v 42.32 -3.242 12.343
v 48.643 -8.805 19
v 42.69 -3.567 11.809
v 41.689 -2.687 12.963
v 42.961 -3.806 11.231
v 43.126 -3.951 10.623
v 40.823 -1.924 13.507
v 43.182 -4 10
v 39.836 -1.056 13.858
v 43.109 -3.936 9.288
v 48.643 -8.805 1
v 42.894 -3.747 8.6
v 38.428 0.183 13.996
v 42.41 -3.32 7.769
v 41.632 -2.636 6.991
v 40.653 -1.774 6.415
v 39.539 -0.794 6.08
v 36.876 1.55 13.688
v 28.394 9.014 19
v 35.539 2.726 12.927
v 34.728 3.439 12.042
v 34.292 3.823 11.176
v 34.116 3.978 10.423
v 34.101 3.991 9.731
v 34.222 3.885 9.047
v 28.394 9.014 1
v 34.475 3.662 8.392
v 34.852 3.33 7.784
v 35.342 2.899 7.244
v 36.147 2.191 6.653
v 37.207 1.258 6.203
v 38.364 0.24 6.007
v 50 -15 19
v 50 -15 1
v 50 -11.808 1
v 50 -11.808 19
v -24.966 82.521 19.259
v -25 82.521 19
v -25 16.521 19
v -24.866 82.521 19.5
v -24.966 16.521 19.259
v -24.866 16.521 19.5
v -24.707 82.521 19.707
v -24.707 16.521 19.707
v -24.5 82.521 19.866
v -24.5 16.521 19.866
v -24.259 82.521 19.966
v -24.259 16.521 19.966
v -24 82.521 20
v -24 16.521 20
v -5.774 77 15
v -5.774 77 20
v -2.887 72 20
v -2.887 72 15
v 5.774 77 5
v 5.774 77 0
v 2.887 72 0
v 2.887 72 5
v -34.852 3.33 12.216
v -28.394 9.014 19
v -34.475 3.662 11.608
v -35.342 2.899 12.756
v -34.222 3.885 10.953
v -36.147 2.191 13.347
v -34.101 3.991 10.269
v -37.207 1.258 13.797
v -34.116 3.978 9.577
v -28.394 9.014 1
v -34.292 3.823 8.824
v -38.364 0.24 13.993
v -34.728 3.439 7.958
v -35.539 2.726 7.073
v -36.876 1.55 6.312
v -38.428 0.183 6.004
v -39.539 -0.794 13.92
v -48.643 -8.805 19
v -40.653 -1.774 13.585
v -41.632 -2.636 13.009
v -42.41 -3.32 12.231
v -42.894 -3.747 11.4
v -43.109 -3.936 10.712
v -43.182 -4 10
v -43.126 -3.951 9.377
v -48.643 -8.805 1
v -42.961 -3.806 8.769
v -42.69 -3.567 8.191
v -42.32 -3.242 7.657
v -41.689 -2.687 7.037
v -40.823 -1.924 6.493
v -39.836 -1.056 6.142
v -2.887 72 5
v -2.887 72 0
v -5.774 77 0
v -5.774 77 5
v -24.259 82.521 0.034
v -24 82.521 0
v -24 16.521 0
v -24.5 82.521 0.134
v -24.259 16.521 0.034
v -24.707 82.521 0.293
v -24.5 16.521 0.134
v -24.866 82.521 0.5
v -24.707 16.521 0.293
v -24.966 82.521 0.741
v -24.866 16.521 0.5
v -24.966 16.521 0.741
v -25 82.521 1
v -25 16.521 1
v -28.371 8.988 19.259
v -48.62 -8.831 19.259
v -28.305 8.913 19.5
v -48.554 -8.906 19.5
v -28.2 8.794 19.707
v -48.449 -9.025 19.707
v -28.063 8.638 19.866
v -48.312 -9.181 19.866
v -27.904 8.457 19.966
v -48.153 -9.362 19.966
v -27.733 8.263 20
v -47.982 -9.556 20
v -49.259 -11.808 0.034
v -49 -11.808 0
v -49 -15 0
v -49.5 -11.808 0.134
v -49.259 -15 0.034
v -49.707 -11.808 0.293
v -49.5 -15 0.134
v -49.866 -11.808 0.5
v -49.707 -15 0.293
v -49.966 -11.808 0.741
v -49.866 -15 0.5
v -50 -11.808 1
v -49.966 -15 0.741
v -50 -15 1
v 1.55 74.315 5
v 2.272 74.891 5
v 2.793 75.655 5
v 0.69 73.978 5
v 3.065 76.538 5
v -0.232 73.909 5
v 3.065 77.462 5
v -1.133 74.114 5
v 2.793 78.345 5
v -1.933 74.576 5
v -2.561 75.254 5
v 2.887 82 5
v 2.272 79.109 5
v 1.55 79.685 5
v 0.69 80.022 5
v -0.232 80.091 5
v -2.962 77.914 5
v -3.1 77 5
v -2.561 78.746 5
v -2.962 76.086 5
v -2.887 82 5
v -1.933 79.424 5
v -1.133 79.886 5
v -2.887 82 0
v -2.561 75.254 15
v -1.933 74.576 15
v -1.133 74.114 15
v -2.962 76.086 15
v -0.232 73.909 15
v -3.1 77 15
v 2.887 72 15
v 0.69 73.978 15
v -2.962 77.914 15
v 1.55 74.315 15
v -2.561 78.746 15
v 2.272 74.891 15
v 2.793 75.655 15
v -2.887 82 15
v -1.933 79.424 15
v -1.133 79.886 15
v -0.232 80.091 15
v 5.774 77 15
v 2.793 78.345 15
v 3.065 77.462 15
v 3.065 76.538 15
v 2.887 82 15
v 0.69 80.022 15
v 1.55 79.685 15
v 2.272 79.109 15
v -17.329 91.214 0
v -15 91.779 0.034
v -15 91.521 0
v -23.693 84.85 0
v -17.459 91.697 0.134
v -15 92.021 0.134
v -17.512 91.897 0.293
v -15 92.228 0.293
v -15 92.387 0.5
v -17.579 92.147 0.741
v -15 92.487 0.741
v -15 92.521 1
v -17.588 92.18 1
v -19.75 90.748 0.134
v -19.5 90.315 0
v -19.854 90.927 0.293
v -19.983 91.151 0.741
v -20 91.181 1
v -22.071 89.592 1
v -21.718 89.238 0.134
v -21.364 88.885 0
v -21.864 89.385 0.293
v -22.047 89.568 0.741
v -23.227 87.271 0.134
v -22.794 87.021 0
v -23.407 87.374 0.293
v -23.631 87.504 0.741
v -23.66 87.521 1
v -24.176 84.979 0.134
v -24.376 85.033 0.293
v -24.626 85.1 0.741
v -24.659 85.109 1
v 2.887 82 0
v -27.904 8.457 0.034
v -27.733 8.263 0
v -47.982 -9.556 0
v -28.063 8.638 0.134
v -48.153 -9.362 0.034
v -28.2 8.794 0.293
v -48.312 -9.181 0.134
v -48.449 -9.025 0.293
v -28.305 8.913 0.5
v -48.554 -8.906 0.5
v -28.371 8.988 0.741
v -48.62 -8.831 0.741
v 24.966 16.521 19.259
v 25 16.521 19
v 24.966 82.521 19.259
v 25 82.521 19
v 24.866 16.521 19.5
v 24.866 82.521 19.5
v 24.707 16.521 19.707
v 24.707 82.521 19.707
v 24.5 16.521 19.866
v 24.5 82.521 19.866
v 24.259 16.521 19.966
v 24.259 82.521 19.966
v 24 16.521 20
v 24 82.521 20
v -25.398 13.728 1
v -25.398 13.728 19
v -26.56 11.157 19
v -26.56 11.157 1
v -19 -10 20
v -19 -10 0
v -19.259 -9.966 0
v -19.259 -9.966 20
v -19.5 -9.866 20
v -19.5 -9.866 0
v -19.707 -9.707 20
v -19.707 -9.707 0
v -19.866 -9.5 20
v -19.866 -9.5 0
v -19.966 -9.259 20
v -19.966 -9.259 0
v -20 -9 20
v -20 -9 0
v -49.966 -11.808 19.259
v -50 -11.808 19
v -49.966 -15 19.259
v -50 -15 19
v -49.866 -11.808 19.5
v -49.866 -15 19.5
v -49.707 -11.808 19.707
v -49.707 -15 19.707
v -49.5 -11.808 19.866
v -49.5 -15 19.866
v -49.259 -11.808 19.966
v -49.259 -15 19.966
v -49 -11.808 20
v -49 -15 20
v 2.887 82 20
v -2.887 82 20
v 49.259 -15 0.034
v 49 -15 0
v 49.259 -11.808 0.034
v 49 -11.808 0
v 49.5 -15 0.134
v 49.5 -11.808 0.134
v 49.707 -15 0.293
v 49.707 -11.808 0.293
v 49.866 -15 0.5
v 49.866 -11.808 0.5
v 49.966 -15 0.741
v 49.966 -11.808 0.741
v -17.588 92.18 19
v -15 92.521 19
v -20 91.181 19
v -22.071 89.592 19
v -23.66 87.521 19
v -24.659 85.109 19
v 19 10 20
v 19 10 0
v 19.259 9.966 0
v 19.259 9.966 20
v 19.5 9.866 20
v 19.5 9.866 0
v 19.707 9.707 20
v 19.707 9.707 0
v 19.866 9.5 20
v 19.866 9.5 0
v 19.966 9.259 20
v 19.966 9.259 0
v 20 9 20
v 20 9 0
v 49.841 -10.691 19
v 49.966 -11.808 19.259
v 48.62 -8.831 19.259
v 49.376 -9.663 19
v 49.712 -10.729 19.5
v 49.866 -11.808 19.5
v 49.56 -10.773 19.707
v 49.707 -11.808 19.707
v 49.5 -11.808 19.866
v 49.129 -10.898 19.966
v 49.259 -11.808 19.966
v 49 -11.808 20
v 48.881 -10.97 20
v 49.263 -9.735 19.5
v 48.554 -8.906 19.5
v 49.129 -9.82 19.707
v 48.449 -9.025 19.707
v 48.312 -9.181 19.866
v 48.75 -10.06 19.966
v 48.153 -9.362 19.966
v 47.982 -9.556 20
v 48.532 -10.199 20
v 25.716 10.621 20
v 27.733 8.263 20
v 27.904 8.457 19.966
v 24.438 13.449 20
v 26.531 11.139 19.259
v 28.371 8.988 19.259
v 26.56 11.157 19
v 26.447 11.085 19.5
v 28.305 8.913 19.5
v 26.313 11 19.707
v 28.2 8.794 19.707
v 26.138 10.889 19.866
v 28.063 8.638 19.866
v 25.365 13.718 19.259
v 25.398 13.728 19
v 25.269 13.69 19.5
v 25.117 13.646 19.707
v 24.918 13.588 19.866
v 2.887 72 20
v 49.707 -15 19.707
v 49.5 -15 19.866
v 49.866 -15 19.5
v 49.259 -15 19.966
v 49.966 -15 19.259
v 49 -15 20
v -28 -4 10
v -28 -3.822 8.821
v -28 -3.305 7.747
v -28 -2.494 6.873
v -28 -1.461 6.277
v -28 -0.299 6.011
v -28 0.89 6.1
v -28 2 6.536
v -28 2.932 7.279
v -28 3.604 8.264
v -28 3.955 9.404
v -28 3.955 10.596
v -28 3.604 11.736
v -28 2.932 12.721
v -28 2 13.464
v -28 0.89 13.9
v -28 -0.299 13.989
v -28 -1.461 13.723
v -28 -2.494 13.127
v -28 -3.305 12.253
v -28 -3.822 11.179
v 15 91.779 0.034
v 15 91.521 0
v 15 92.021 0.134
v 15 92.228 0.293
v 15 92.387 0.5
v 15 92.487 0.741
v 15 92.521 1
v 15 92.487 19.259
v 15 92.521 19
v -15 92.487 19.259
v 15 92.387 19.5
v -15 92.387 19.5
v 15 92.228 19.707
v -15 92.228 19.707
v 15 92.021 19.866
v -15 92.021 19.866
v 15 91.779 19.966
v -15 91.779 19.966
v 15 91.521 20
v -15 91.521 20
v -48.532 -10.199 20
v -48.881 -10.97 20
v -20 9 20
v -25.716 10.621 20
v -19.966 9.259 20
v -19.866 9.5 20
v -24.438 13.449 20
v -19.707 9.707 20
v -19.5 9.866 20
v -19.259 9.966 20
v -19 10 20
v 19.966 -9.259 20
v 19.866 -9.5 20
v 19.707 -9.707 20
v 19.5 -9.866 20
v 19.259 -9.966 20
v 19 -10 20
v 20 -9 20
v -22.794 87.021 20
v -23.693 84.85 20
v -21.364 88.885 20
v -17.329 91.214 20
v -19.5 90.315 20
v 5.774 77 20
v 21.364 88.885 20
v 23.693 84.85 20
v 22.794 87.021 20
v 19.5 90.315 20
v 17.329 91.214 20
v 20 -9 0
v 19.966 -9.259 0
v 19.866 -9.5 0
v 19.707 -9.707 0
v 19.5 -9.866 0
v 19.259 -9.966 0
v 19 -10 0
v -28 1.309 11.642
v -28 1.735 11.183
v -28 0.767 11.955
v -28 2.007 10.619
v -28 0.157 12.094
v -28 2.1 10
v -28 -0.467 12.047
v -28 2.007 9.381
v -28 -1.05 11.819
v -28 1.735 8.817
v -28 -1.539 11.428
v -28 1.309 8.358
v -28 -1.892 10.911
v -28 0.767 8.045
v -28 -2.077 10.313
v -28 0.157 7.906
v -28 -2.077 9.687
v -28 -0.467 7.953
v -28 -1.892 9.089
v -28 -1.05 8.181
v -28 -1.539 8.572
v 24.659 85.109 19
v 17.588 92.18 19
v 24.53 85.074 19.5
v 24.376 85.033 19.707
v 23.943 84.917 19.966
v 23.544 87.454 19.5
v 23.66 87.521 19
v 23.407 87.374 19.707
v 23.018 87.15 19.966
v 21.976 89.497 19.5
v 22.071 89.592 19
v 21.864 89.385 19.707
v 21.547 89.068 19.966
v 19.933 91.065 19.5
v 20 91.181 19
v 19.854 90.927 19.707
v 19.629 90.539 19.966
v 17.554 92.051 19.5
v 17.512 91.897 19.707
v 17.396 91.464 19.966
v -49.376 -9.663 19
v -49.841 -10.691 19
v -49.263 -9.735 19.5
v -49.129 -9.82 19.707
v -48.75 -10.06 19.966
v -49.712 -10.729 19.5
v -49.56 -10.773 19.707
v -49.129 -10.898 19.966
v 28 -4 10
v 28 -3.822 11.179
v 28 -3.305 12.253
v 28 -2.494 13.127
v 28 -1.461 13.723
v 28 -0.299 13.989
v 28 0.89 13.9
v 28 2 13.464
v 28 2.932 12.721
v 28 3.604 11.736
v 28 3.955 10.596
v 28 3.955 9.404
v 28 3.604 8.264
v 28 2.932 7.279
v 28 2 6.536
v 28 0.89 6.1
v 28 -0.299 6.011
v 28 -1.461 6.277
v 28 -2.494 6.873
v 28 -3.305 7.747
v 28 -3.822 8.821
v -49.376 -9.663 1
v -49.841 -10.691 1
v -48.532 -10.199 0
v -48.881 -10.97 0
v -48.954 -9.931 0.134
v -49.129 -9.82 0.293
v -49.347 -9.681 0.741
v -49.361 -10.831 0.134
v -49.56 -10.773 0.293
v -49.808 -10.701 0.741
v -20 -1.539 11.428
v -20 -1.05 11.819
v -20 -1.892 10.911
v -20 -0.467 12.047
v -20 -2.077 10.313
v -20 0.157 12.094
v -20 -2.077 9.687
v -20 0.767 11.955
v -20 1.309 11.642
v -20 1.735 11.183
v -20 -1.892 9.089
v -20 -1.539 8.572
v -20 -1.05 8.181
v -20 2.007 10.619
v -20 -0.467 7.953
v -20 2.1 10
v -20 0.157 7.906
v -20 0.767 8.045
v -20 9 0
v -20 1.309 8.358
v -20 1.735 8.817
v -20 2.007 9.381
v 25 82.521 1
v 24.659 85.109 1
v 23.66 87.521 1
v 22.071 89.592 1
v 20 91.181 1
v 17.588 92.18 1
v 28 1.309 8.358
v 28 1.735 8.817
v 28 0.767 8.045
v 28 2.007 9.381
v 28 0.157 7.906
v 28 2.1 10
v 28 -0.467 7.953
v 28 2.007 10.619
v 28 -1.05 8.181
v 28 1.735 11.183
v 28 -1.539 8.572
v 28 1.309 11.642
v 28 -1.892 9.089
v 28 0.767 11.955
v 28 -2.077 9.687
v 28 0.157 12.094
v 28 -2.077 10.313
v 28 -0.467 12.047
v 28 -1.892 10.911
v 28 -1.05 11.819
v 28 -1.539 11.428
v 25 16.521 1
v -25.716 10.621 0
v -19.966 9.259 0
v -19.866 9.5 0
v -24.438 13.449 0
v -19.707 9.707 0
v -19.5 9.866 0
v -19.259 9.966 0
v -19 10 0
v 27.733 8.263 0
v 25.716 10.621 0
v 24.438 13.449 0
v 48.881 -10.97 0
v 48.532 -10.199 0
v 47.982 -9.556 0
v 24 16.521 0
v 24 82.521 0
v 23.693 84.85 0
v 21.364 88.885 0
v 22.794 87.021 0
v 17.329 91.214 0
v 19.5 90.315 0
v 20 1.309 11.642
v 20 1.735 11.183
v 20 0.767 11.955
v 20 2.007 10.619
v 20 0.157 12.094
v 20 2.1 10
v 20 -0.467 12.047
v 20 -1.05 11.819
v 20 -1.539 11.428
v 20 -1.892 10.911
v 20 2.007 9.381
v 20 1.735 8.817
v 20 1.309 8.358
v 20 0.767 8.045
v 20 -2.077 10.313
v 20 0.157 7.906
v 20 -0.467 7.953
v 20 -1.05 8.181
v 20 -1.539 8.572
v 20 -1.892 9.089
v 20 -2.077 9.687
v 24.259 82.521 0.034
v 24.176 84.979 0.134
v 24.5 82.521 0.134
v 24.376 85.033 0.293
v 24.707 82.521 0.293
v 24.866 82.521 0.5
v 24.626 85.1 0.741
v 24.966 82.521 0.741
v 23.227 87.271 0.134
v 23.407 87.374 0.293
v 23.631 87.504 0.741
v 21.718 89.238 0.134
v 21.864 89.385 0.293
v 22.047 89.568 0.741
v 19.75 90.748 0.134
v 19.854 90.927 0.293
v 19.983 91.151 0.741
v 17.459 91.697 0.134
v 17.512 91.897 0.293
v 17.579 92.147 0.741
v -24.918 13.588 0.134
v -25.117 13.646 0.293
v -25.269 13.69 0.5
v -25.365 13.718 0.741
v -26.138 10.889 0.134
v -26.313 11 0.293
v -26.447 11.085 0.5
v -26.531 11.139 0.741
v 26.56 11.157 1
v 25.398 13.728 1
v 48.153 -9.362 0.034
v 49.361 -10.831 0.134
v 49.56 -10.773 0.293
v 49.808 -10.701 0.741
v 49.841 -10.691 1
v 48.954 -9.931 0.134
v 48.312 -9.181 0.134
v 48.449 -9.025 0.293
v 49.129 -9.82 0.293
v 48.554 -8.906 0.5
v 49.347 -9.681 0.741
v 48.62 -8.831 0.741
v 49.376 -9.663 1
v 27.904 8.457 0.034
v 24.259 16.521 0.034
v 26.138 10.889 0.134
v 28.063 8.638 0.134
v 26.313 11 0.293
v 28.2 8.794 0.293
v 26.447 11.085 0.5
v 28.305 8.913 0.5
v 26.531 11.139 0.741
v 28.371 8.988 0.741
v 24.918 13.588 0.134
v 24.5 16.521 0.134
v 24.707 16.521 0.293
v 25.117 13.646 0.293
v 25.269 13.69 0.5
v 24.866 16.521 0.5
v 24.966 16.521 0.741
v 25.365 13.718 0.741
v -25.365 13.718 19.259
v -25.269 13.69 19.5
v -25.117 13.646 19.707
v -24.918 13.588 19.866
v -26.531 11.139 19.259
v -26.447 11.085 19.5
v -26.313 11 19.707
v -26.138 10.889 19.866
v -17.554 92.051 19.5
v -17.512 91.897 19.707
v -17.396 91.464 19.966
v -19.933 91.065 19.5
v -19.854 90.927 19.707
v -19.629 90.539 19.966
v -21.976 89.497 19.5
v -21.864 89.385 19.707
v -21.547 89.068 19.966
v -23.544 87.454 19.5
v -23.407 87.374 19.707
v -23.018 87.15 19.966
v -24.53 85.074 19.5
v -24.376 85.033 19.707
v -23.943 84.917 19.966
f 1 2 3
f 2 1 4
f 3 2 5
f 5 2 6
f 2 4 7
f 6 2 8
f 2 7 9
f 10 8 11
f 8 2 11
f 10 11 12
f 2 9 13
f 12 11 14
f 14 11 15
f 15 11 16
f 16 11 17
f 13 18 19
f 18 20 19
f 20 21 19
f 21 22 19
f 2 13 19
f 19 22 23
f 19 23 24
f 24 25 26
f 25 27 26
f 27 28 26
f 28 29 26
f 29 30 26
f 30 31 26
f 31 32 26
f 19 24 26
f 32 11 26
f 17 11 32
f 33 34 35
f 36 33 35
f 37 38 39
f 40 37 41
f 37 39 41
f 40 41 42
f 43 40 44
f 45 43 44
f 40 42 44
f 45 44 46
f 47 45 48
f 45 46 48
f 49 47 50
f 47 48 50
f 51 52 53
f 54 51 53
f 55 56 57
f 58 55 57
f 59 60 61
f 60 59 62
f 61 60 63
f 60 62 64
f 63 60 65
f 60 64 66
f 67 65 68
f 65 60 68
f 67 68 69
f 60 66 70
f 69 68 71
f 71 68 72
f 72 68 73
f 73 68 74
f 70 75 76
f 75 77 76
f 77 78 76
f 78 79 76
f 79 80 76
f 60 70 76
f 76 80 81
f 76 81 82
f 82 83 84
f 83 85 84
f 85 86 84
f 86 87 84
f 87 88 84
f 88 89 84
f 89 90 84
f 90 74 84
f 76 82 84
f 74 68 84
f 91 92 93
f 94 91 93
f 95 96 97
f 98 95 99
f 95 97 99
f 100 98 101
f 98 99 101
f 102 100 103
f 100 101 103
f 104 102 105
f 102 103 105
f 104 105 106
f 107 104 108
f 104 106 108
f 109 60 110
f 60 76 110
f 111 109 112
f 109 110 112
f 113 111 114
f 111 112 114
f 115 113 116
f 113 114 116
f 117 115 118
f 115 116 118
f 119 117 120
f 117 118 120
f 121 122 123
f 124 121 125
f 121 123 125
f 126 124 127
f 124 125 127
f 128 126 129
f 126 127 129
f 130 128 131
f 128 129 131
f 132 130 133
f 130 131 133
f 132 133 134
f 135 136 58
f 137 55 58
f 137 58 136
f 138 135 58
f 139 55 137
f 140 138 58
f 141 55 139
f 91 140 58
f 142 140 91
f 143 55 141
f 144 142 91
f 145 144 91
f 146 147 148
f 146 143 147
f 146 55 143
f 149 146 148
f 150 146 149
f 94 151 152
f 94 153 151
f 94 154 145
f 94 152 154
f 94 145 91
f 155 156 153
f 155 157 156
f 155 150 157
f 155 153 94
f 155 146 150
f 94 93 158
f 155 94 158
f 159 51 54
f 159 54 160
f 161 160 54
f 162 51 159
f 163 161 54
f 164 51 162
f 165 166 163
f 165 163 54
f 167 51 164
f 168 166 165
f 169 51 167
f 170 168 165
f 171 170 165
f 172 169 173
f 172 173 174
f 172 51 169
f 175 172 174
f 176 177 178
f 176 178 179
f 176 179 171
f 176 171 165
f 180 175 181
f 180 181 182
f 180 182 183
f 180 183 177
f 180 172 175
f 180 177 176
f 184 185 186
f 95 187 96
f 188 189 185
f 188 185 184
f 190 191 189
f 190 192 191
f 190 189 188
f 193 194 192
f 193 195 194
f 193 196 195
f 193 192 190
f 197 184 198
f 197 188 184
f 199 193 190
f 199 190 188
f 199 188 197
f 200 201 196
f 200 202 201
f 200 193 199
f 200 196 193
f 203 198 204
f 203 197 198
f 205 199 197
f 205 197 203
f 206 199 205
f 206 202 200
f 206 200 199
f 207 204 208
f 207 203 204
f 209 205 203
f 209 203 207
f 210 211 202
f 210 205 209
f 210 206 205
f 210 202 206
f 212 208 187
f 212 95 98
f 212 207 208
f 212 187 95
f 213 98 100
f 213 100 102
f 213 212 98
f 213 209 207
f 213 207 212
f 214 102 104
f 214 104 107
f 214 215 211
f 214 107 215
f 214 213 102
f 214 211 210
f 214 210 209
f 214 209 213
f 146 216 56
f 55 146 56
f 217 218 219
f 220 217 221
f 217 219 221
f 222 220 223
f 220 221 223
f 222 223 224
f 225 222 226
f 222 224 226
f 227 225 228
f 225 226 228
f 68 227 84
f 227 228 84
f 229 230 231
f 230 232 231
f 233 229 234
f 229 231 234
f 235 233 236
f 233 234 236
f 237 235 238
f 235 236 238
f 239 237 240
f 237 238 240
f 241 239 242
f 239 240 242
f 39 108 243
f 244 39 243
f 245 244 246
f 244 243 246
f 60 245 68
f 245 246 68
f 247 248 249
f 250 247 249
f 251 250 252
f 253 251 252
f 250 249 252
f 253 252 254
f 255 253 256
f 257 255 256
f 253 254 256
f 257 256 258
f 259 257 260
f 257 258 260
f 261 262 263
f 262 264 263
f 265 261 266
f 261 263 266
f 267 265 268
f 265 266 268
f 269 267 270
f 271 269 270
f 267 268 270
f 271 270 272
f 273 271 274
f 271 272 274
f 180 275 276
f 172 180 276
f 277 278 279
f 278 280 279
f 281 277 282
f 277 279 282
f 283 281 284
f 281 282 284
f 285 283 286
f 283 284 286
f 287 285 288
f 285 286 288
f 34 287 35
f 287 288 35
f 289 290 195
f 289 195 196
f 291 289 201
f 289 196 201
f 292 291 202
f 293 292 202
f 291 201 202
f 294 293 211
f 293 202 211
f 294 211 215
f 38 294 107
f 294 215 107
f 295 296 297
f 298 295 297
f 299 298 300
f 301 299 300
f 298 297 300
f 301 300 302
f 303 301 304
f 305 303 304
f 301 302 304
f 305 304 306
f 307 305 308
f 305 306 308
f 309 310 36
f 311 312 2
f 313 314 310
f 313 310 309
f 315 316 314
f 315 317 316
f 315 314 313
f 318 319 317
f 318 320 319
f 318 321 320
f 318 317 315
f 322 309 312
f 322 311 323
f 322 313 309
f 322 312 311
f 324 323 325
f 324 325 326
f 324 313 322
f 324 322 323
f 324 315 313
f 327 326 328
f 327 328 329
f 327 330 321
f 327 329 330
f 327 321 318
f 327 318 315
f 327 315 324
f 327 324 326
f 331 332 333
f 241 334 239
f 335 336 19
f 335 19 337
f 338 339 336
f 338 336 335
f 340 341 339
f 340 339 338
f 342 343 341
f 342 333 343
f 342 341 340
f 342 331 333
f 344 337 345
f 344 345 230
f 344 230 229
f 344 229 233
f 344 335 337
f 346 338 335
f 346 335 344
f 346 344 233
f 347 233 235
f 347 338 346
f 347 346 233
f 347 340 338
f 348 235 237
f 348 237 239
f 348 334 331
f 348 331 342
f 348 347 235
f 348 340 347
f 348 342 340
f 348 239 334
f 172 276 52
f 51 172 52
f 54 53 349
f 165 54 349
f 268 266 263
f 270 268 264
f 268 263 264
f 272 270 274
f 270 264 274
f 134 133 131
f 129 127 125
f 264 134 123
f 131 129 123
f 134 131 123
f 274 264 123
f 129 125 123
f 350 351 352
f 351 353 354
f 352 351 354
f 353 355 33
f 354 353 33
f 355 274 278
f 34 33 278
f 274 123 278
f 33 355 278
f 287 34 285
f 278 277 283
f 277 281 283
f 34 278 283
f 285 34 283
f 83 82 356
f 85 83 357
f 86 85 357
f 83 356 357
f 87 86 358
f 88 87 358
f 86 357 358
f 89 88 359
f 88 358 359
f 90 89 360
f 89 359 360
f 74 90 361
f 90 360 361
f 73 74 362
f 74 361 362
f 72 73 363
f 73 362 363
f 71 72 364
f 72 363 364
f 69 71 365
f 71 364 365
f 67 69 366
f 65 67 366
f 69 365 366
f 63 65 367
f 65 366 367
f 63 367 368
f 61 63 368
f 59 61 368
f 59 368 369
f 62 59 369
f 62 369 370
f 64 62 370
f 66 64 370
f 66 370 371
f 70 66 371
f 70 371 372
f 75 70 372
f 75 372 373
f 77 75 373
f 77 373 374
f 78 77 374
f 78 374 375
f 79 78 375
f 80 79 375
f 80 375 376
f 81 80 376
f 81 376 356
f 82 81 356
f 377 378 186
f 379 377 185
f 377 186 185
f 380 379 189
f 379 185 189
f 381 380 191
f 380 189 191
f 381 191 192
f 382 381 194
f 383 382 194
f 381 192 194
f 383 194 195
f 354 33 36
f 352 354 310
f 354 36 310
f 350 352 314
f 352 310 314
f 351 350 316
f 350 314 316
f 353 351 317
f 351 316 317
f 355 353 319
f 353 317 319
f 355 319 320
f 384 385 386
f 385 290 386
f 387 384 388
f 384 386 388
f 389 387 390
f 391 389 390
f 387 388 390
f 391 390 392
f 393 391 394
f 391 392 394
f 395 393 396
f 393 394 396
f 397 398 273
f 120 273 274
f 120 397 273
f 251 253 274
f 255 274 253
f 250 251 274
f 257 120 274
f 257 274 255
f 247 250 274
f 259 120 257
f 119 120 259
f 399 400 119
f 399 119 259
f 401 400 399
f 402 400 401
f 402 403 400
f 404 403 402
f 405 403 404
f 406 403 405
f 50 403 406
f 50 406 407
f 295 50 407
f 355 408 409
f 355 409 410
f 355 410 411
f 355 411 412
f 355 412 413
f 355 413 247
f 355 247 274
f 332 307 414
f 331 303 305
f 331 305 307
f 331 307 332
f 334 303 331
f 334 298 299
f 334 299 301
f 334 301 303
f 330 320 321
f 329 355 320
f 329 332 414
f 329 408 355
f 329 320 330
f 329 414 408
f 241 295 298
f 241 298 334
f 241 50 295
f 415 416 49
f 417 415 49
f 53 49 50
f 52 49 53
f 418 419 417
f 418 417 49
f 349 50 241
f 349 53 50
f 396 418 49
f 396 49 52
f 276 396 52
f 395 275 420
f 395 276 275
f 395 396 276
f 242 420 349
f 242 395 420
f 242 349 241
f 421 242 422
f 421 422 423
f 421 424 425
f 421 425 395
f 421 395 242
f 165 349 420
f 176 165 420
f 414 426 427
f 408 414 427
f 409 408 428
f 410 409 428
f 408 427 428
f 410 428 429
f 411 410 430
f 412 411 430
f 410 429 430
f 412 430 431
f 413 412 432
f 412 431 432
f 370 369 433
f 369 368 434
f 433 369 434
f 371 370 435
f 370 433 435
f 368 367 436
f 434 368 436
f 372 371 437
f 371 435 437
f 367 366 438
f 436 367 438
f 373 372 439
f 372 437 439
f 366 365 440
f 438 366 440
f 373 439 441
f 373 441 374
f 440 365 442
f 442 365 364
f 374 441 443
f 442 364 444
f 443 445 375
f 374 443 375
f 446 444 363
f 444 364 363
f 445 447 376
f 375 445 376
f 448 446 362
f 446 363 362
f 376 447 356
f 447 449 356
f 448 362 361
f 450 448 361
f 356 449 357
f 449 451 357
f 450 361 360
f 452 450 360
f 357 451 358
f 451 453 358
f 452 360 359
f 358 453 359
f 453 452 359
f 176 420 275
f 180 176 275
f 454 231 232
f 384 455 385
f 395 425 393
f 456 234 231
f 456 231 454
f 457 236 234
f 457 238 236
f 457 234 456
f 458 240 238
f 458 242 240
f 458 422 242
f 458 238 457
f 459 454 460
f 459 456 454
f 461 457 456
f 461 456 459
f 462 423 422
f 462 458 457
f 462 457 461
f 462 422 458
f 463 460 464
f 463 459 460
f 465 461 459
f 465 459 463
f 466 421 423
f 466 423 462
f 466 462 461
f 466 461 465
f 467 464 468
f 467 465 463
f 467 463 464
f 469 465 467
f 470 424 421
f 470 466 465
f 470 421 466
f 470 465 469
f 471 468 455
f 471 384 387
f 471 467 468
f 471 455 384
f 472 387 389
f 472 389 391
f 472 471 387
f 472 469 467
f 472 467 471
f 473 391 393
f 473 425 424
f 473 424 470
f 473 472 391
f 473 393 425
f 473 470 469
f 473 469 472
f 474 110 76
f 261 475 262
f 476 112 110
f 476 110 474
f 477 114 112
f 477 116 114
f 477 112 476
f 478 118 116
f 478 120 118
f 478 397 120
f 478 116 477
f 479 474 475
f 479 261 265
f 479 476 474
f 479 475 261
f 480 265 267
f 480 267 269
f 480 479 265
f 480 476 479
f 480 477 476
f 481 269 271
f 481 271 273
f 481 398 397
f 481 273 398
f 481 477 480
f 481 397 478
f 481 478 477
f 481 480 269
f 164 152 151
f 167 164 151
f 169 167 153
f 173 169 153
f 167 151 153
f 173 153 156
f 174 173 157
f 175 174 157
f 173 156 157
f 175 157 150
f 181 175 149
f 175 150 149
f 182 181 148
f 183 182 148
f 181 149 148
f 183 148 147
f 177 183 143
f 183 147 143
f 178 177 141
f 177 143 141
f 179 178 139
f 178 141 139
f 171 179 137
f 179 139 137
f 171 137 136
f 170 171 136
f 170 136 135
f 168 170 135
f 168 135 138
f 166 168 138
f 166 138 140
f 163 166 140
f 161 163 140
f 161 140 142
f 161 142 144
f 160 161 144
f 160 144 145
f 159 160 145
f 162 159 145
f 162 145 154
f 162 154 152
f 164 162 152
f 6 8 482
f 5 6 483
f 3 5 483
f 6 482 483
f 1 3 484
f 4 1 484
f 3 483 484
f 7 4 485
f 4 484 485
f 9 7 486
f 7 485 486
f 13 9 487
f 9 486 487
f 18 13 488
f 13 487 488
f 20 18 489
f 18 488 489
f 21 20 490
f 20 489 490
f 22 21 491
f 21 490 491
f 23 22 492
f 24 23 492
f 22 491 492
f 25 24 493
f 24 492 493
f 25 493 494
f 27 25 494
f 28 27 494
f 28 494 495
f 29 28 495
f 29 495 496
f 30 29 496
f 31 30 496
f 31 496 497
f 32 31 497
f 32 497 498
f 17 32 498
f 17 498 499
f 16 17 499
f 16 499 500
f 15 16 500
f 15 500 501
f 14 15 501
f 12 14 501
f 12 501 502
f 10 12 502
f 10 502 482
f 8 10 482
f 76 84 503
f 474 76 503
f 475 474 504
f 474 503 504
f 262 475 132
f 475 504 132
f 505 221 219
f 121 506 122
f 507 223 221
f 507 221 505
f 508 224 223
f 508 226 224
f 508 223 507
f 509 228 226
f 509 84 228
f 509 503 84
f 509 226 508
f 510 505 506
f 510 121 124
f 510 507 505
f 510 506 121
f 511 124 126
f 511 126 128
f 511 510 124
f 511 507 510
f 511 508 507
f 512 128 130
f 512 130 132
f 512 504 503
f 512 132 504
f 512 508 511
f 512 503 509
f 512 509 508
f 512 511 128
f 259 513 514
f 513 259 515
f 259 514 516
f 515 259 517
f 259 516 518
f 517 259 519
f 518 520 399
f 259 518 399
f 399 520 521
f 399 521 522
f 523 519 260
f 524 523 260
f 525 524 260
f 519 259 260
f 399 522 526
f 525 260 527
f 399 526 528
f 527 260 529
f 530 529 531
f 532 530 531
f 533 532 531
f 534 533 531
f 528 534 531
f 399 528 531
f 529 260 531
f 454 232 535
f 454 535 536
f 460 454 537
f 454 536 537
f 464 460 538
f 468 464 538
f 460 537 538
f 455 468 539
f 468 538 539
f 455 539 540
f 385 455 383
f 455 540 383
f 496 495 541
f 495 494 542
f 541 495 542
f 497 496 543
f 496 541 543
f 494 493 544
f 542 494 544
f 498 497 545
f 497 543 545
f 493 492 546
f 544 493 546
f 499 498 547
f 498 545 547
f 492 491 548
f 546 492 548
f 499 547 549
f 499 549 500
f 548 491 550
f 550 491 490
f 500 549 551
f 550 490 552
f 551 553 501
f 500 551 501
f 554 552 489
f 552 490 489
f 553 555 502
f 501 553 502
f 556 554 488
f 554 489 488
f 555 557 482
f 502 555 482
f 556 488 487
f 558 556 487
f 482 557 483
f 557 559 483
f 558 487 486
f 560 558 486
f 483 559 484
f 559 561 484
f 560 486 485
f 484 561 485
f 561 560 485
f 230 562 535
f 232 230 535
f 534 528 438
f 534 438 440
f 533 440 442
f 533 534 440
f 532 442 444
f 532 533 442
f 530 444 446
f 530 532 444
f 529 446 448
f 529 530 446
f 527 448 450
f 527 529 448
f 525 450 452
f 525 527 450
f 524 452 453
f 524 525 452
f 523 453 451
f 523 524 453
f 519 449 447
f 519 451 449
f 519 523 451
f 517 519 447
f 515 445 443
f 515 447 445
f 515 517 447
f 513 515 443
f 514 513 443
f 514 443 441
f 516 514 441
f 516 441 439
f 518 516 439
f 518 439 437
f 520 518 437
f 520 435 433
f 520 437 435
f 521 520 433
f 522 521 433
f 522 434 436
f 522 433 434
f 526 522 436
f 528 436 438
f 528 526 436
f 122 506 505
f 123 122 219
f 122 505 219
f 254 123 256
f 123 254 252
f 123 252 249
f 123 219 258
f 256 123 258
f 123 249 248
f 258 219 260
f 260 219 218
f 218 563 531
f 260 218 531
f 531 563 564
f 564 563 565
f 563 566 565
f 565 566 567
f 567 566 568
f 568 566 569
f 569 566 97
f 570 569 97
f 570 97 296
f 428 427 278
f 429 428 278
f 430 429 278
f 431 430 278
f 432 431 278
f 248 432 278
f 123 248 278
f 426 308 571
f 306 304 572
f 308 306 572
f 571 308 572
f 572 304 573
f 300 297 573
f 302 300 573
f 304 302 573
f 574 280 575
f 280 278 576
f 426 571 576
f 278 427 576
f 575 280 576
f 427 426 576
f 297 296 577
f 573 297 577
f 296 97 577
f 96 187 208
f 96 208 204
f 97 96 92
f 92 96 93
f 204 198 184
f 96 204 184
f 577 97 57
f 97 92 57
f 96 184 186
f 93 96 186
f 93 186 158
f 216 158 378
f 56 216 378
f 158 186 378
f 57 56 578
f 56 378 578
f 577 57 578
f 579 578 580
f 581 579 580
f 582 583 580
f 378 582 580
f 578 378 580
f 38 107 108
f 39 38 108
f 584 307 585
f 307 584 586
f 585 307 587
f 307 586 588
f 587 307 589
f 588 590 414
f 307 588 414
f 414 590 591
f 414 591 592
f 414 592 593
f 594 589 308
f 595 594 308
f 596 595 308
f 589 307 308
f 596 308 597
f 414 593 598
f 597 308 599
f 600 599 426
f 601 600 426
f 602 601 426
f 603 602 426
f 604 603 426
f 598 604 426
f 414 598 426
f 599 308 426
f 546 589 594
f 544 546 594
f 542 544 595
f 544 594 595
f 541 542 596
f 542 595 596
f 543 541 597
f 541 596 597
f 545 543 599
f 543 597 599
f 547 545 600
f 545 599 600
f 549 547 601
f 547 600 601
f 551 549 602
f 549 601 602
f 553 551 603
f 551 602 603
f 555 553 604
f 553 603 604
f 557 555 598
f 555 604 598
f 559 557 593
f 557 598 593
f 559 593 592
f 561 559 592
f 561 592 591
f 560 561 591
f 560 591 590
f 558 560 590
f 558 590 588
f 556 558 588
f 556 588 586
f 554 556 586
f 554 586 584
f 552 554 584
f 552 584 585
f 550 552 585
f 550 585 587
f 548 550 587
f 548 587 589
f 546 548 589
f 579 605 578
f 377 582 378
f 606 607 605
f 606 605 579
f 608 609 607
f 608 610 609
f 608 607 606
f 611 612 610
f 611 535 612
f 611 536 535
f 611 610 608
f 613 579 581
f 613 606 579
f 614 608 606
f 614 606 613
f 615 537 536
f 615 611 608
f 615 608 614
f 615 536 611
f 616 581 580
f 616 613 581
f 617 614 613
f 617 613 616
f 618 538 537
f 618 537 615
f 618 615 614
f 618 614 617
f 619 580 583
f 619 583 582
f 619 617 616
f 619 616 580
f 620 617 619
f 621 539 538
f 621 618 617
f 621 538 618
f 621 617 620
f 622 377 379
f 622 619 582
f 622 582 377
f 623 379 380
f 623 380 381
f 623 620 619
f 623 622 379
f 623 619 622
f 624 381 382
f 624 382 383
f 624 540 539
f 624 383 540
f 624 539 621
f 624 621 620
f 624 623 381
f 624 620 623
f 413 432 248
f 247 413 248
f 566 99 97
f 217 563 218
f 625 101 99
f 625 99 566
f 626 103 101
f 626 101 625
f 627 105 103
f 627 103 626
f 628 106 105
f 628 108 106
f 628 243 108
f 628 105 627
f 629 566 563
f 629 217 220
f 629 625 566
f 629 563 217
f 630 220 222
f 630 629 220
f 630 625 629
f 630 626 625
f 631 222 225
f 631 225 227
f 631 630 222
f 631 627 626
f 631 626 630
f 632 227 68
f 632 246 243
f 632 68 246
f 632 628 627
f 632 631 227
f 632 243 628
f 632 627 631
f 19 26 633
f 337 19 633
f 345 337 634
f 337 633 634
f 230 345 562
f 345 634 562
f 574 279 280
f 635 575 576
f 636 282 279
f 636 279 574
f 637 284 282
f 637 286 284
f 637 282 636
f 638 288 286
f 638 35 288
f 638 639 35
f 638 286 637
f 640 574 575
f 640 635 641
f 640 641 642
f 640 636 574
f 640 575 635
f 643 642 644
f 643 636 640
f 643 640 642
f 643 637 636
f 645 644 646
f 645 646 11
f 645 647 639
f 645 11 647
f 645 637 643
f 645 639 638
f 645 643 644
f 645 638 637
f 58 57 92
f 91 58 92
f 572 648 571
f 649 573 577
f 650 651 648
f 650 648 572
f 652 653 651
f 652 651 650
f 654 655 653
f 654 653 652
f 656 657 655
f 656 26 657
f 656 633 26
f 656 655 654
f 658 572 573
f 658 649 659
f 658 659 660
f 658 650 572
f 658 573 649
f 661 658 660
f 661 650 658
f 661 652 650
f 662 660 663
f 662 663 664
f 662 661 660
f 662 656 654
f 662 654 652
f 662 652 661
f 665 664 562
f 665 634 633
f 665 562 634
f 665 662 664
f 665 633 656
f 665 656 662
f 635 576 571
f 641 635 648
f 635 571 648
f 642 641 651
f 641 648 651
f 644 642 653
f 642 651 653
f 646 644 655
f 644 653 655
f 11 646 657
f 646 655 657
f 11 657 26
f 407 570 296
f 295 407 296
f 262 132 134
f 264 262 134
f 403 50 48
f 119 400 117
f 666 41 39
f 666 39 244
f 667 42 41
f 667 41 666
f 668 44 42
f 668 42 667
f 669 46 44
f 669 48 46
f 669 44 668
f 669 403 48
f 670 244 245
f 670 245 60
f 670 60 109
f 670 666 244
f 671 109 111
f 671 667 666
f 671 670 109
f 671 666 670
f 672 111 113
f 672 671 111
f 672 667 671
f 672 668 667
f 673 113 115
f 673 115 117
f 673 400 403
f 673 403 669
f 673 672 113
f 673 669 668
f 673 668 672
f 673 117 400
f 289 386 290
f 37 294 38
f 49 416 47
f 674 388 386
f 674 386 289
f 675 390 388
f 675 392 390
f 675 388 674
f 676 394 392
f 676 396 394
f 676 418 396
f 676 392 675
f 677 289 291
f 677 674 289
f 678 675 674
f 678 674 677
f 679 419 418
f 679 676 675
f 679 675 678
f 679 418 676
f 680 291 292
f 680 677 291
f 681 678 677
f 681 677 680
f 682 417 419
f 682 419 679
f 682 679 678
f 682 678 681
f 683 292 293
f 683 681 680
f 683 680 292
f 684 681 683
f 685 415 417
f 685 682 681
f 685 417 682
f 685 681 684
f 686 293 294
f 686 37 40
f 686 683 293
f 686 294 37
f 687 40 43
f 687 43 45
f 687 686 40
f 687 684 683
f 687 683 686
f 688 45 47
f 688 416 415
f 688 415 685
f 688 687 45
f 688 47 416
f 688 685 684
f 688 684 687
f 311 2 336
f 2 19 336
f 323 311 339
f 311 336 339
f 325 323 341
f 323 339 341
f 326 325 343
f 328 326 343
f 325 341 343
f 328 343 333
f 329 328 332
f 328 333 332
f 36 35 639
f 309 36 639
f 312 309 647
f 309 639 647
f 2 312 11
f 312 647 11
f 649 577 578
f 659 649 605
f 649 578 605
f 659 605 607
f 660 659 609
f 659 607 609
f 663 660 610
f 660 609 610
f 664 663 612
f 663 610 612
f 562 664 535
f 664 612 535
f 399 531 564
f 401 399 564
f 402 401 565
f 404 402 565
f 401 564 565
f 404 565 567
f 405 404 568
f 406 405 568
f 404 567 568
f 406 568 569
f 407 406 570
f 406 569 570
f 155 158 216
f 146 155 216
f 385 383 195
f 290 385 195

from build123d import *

# Parameters (mm, degrees)
BOSS_EXTRUDE1_DEPTH            = 20
CUT_EXTRUDE7_REACH             = 109.052
SKETCH8_R                      = 3.1
FILLET1_R                      = 1
CUT_EXTRUDE8_REACH             = 119.729
SKETCH9_R                      = 2.1
CUT_EXTRUDE8_DIRECTION_2_REACH = 119.729
CUT_EXTRUDE9_REACH             = 127.729
CUT_EXTRUDE9_START             = -8
SKETCH10_R                     = 4
CUT_EXTRUDE10_REACH            = 127.729
CUT_EXTRUDE10_START            = -8
SKETCH11_R                     = 4
CUT_EXTRUDE11_DEPTH            = 5
CUT_EXTRUDE12_DEPTH            = 5


with BuildPart() as part:
    # Sketch1 → Boss-Extrude1 (new body)
    with BuildSketch(Plane.XY):
        with BuildLine():
            Line((-50, -15), (50, -15))
            Line((50, -15), (50, -11.808264258))
            ThreePointArc((50, -11.808264258), (49.644862571, -10.16054558), (48.64251158, -8.80541019))
            Line((48.64251158, -8.80541019), (28.393721051, 9.013525475))
            ThreePointArc((28.393721051, 9.013525475), (25.887843573, 12.40136395), (25, 16.520660644))
            Line((25, 16.520660644), (25, 82.520660644))
            ThreePointArc((25, 82.520660644), (22.071067812, 89.591728456), (15, 92.520660644))
            Line((15, 92.520660644), (-15, 92.520660644))
            ThreePointArc((-15, 92.520660644), (-22.071067812, 89.591728456), (-25, 82.520660644))
            Line((-25, 82.520660644), (-25, 16.520660644))
            ThreePointArc((-25, 16.520660644), (-25.887843573, 12.40136395), (-28.393721051, 9.013525475))
            Line((-28.393721051, 9.013525475), (-48.64251158, -8.80541019))
            ThreePointArc((-48.64251158, -8.80541019), (-49.644862571, -10.16054558), (-50, -11.808264258))
            Line((-50, -11.808264258), (-50, -15))
        make_face()
        with BuildLine():
            Line((-19, 10), (19, 10))
            ThreePointArc((19, 10), (19.707106781, 9.707106781), (20, 9))
            Line((20, 9), (20, -9))
            ThreePointArc((20, -9), (19.707106781, -9.707106781), (19, -10))
            Line((19, -10), (-19, -10))
            ThreePointArc((-19, -10), (-19.707106781, -9.707106781), (-20, -9))
            Line((-20, -9), (-20, 9))
            ThreePointArc((-20, 9), (-19.707106781, 9.707106781), (-19, 10))
        make_face(mode=Mode.SUBTRACT)
    extrude(amount=BOSS_EXTRUDE1_DEPTH)

    # Sketch8 → Cut-Extrude7 (cut, up to next)
    with BuildSketch(Plane(origin=(0, 0, 0), x_dir=(-1, 0, 0), z_dir=(0, 0, -1)), mode=Mode.PRIVATE) as cut_extrude7_sk1:
        with Locations((0, 77)):
            Circle(SKETCH8_R)
    cut_extrude7_tool1 = extrude(cut_extrude7_sk1.sketch, amount=-CUT_EXTRUDE7_REACH, mode=Mode.PRIVATE) & part.part
    add(cut_extrude7_tool1.solids().sort_by_distance((0, 77, 0))[0], mode=Mode.SUBTRACT)

    # Fillet1
    fillet1_edges = [part.edges().sort_by_distance(p)[0] for p in [
        (50, -13.404132129, 20),
        (-49.644862571, -10.16054558, 0),
        (-38.518116315, 0.104057643, 0),
        (49.644862571, -10.16054558, 20),
        (-25.887843573, 12.40136395, 0),
        (-25, 49.520660644, 0),
        (-22.071067812, 89.591728456, 0),
        (0, 92.520660644, 0),
        (22.071067812, 89.591728456, 0),
        (25, 49.520660644, 0),
        (25.887843573, 12.40136395, 0),
        (38.518116315, 0.104057643, 20),
        (38.518116315, 0.104057643, 0),
        (49.644862571, -10.16054558, 0),
        (50, -13.404132129, 0),
        (-50, -13.404132129, 0),
        (25.887843573, 12.40136395, 20),
        (25, 49.520660644, 20),
        (22.071067812, 89.591728456, 20),
        (0, 92.520660644, 20),
        (-22.071067812, 89.591728456, 20),
        (-25, 49.520660644, 20),
        (-25.887843573, 12.40136395, 20),
        (-50, -13.404132129, 20),
        (-38.518116315, 0.104057643, 20),
        (-49.644862571, -10.16054558, 20),
    ]]
    fillet(fillet1_edges, radius=FILLET1_R)

    # Sketch9 → Cut-Extrude8 (cut, up to next)
    with BuildSketch(Plane.ZY.offset(-20), mode=Mode.PRIVATE) as cut_extrude8_sk1:
        with Locations(Location((10, 0, 0), (0, 0, 90))):
            Circle(SKETCH9_R)
    cut_extrude8_tool1 = extrude(cut_extrude8_sk1.sketch, amount=-CUT_EXTRUDE8_REACH, mode=Mode.PRIVATE) & part.part
    add(cut_extrude8_tool1.solids().sort_by_distance((20, 0, 10))[0], mode=Mode.SUBTRACT)

    # Sketch9 → Cut-Extrude8 direction 2 (cut, up to next)
    with BuildSketch(Plane.ZY.offset(-20), mode=Mode.PRIVATE) as cut_extrude8_direction_2_sk1:
        with Locations(Location((10, 0, 0), (0, 0, 90))):
            Circle(SKETCH9_R)
    cut_extrude8_direction_2_tool1 = extrude(cut_extrude8_direction_2_sk1.sketch, amount=CUT_EXTRUDE8_DIRECTION_2_REACH, mode=Mode.PRIVATE) & part.part
    add(cut_extrude8_direction_2_tool1.solids().sort_by_distance((20, 0, 10))[0], mode=Mode.SUBTRACT)

    # Cut-Extrude9: up to this plane
    cut_extrude9_end = Plane(origin=(48.64251158, -8.80541019, 20), z_dir=(-0.660627894892025, -0.750713516922755, 0))
    # Sketch10 → Cut-Extrude9 (cut, up to the surface)
    with BuildSketch(Plane.ZY.offset(-20).offset(CUT_EXTRUDE9_START), mode=Mode.PRIVATE) as cut_extrude9_sk1:
        with Locations(Location((10, 0, 0), (0, 0, 270))):
            Circle(SKETCH10_R)
    cut_extrude9_tool1 = split(extrude(cut_extrude9_sk1.sketch, amount=-CUT_EXTRUDE9_REACH, mode=Mode.PRIVATE), bisect_by=cut_extrude9_end, keep=Keep.BOTH, mode=Mode.PRIVATE)
    add(cut_extrude9_tool1.solids().sort_by_distance((28, 0, 10))[0], mode=Mode.SUBTRACT)

    # Cut-Extrude10: up to this plane
    cut_extrude10_end = Plane(origin=(-48.64251158, -8.80541019, 20), z_dir=(0.6606278948920247, -0.7507135169227553, 0))
    # Sketch11 → Cut-Extrude10 (cut, up to the surface)
    with BuildSketch(Plane(origin=(-20, 0, 0), x_dir=(0, 0, -1), z_dir=(1, 0, 0)).offset(CUT_EXTRUDE10_START), mode=Mode.PRIVATE) as cut_extrude10_sk1:
        with Locations(Location((-10, 0, 0), (0, 0, 270))):
            Circle(SKETCH11_R)
    cut_extrude10_tool1 = split(extrude(cut_extrude10_sk1.sketch, amount=-CUT_EXTRUDE10_REACH, mode=Mode.PRIVATE), bisect_by=cut_extrude10_end, keep=Keep.BOTH, mode=Mode.PRIVATE)
    add(cut_extrude10_tool1.solids().sort_by_distance((-28, 0, 10))[0], mode=Mode.SUBTRACT)

    # Sketch12 → Cut-Extrude11 (cut)
    with BuildSketch(Plane(origin=(0, 0, 0), x_dir=(-1, 0, 0), z_dir=(0, 0, -1))):
        Polygon((5.773502692, 77), (2.886751346, 82), (-2.886751346, 82), (-5.773502692, 77), (-2.886751346, 72), (2.886751346, 72), align=None)
    extrude(amount=-CUT_EXTRUDE11_DEPTH, mode=Mode.SUBTRACT)

    # Sketch13 → Cut-Extrude12 (cut)
    with BuildSketch(Plane.XY.offset(20)):
        Polygon((5.773502692, 77), (2.886751346, 82), (-2.886751346, 82), (-5.773502692, 77), (-2.886751346, 72), (2.886751346, 72), align=None)
    extrude(amount=-CUT_EXTRUDE12_DEPTH, mode=Mode.SUBTRACT)


solid = part.part
